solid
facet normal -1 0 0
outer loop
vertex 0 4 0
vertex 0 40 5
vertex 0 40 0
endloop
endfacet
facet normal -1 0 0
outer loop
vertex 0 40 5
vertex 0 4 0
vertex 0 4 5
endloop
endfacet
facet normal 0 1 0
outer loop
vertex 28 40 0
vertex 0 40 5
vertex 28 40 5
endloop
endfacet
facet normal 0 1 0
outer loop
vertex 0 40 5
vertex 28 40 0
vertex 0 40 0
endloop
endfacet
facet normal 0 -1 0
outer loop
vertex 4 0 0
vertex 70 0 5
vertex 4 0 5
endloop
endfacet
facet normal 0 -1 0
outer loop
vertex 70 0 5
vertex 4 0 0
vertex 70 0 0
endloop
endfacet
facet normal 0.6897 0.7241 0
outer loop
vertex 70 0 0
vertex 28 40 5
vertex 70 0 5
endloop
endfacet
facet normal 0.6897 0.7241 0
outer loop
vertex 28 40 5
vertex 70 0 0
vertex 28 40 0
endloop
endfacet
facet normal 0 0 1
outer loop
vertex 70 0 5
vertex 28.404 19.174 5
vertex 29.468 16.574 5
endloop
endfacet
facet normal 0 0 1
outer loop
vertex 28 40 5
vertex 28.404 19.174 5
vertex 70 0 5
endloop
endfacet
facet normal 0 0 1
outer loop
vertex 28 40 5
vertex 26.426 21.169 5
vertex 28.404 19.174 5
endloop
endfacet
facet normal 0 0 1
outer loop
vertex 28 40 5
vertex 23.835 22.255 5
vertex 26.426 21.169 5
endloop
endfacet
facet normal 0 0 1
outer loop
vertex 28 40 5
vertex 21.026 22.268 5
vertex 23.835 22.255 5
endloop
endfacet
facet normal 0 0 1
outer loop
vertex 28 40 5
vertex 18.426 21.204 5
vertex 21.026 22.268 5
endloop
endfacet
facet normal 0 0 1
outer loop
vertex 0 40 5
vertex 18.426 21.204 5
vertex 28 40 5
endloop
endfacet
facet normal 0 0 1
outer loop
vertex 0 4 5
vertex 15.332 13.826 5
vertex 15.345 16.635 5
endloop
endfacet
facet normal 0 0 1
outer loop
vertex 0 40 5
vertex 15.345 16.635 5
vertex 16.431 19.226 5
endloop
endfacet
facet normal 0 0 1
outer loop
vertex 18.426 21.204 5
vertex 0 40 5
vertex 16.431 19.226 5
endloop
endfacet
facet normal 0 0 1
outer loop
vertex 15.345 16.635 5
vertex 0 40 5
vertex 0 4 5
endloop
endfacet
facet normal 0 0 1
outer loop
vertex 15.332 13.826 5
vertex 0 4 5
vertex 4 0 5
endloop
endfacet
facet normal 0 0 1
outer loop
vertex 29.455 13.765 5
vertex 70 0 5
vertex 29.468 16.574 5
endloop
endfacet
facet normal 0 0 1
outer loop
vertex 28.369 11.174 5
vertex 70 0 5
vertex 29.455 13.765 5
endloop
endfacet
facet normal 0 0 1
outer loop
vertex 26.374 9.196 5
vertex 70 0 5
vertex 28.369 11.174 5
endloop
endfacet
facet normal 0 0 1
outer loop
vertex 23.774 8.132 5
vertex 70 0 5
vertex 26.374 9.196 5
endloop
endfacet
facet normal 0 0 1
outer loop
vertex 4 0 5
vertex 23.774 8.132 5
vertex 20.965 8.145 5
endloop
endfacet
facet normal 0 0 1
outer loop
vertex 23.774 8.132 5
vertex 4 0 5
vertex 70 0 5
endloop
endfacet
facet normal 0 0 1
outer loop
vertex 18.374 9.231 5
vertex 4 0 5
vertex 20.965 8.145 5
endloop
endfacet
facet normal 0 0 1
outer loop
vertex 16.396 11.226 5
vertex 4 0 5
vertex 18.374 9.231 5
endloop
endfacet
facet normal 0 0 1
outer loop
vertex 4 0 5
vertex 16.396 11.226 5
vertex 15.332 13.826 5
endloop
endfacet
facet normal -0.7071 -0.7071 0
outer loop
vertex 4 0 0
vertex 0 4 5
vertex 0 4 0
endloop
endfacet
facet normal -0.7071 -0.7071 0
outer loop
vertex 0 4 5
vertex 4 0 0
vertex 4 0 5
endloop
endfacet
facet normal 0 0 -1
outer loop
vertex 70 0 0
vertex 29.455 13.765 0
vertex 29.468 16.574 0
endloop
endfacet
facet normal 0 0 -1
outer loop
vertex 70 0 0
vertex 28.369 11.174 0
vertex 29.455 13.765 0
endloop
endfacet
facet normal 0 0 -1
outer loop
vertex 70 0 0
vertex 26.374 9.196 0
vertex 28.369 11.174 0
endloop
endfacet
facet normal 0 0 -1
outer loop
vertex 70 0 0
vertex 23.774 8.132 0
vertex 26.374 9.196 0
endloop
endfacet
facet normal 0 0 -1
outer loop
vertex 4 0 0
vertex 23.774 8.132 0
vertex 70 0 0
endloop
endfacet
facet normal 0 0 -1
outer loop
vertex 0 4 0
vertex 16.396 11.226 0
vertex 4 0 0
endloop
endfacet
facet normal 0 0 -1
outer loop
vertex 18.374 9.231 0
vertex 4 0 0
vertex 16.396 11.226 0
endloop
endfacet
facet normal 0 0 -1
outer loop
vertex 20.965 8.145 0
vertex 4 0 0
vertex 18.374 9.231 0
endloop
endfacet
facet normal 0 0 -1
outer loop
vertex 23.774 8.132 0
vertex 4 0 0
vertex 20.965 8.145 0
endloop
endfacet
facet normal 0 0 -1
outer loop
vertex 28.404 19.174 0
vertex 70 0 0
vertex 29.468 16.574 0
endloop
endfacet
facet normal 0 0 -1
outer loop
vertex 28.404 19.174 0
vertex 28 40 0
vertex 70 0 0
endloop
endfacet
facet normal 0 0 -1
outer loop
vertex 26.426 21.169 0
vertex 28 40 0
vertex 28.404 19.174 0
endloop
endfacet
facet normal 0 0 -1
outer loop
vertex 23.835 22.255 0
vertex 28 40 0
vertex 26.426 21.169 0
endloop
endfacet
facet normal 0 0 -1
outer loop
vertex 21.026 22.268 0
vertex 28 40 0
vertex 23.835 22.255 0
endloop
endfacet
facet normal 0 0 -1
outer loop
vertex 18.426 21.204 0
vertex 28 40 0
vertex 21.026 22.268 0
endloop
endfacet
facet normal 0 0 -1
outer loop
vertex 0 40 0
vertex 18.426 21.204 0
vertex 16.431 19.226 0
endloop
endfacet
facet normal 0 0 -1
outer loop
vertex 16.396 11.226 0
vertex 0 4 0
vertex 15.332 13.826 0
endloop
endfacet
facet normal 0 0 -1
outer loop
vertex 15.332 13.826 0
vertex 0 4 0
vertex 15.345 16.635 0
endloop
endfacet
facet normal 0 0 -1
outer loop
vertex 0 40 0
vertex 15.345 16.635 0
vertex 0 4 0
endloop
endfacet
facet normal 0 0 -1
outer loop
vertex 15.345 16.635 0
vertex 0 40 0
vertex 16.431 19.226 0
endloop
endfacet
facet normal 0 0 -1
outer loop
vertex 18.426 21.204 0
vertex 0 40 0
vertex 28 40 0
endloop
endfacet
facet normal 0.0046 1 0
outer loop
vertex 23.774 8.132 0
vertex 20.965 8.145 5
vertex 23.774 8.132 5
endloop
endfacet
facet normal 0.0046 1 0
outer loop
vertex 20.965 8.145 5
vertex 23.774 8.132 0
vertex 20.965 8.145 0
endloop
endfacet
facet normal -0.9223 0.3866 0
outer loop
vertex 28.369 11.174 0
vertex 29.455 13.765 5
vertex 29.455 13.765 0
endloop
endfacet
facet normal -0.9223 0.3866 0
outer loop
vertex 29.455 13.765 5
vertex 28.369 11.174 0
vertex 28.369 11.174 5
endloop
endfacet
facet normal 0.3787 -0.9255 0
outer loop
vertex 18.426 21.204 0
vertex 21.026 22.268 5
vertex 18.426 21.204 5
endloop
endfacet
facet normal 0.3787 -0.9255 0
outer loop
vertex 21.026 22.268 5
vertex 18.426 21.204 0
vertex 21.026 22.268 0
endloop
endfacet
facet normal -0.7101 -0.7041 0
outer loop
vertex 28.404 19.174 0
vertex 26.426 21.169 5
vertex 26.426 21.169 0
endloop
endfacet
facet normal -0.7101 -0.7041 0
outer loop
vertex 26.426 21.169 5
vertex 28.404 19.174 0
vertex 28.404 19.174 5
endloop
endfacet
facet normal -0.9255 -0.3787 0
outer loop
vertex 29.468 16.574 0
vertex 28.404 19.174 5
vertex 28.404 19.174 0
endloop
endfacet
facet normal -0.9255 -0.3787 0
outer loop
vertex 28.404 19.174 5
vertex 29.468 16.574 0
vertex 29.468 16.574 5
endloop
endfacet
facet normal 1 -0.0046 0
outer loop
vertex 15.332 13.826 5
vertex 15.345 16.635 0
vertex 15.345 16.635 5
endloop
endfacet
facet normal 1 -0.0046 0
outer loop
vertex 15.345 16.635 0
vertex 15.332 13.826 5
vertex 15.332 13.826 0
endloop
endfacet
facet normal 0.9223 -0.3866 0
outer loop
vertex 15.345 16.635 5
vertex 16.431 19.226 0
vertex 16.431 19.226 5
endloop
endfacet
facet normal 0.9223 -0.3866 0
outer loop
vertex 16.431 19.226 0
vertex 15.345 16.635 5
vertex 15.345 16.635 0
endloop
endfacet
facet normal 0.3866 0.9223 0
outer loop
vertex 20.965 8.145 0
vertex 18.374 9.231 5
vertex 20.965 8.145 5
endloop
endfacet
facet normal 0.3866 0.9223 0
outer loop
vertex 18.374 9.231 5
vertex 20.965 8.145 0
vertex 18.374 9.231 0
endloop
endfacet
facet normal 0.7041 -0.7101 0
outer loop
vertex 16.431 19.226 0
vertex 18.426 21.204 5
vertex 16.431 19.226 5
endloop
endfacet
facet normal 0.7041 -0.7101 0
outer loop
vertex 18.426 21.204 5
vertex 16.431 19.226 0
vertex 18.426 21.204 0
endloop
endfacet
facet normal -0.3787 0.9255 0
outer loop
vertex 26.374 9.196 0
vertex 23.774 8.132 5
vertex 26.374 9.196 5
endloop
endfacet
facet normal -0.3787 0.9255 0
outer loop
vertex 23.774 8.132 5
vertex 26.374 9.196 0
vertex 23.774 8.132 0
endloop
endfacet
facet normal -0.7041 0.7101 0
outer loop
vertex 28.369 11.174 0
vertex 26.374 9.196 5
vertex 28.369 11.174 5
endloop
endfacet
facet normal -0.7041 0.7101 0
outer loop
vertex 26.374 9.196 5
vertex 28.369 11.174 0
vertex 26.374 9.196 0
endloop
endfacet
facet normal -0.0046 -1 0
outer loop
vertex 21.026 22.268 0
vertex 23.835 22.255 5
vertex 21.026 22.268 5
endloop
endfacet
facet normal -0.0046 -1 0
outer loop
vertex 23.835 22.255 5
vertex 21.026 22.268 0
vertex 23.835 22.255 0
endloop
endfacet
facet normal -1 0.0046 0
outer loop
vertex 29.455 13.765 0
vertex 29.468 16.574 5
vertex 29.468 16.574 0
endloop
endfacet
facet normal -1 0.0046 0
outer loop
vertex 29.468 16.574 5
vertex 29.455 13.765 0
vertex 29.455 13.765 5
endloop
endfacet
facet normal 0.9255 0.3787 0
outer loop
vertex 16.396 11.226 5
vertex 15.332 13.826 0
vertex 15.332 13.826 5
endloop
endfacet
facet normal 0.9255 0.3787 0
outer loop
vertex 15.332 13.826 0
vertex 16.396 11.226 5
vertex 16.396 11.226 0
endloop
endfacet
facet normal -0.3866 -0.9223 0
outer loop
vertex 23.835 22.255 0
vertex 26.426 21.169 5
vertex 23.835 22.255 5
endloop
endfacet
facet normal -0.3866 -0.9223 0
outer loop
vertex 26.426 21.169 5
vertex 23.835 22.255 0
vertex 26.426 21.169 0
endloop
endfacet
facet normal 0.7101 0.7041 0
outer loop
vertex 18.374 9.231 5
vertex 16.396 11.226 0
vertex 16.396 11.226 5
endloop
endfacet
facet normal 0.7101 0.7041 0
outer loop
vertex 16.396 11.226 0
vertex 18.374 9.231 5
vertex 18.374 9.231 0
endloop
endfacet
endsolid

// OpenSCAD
$fn = 32;

// ----------------------------------------------------------------------
// Bracket plate: gusset 70 x 40
// ----------------------------------------------------------------------

// --- parameters (mm) ---
hole_r = 3.5;             // bolt hole radius
plate_t = 5;              // plate thickness, Z (extrusion height)
gus_a = 70;               // base length
gus_b = 40;               // height
top_x = 28;               // top edge X of the angled cut
light_r = 7.2;            // lightening hole radius

light_d = 2 * light_r;

profile = [[4, 0], [35, 0], [70, 0], [28, 40], [0, 40], [0, 4]];  // primary outline, 6 points, counter clockwise
void_1 = [[29.468, 16.574], [28.404, 19.174], [26.426, 21.169], [23.835, 22.255], [21.026, 22.268], [18.426, 21.204], [16.431, 19.226], [15.345, 16.635], [15.332, 13.826], [16.396, 11.226], [18.374, 9.231], [20.965, 8.145], [23.774, 8.132], [26.374, 9.196], [28.369, 11.174], [29.455, 13.765]];  // lightening hole, 16 points

// --- the one profile operation ---
difference() {
  linear_extrude(height = plate_t) polygon(points = profile);
  translate([0, 0, -1])
    linear_extrude(height = plate_t + 2) polygon(points = void_1);
}
